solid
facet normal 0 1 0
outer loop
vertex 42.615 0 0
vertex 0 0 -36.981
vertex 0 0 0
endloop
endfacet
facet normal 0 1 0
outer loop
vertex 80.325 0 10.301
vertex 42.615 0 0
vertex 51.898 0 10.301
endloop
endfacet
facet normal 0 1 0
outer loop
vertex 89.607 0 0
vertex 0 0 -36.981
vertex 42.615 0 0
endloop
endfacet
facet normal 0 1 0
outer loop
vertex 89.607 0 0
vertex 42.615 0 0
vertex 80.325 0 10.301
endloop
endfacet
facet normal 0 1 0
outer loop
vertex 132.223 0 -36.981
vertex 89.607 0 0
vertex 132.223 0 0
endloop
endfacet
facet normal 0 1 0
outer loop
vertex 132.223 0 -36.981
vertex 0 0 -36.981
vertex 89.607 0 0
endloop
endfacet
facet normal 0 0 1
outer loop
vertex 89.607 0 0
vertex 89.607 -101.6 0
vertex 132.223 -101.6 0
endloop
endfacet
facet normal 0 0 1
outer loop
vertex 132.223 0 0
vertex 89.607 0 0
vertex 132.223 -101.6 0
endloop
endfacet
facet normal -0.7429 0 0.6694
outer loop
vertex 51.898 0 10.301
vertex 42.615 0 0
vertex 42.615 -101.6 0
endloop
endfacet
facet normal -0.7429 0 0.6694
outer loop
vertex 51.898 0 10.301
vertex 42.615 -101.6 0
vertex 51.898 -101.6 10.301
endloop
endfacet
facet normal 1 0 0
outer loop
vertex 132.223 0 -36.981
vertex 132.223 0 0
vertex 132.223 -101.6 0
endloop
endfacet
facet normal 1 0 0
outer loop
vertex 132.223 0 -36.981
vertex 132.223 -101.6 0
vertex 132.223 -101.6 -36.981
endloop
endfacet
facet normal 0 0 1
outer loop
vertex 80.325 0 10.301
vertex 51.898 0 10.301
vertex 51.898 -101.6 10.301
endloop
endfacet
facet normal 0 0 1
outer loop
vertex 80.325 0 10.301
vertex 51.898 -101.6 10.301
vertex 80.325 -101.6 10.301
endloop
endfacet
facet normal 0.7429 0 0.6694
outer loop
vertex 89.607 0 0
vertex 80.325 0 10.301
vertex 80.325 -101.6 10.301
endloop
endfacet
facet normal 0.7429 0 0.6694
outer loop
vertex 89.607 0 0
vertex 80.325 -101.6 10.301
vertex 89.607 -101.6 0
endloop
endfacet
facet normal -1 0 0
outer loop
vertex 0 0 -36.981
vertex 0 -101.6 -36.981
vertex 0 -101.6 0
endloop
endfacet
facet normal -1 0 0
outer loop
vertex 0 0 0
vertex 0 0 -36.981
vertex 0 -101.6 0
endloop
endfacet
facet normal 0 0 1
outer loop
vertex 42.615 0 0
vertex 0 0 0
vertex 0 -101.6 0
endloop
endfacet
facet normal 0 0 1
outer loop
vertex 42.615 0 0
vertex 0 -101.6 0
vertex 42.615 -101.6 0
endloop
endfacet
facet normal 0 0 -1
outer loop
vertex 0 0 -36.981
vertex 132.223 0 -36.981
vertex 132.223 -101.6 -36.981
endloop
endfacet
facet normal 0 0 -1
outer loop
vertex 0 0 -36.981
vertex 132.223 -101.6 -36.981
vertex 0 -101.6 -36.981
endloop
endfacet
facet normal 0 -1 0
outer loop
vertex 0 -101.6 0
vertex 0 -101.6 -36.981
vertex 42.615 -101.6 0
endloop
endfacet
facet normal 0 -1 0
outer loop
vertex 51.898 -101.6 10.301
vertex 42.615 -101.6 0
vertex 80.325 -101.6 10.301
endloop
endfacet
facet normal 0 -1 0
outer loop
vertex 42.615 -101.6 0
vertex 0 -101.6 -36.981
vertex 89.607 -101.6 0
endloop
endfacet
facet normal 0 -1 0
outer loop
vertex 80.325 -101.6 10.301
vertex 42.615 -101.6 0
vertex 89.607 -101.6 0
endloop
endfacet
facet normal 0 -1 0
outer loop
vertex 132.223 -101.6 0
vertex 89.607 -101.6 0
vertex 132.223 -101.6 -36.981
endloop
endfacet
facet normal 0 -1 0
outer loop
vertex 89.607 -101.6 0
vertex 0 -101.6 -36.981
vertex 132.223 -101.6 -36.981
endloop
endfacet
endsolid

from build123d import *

# Parameters (mm, degrees)
EXTRUDE1_DEPTH = 101.6


with BuildPart() as part:
    # Sketch1 → Extrude1 (new body)
    with BuildSketch(Plane(origin=(0, 0, 0), x_dir=(1, 0, 0), z_dir=(0, 1, 0))):
        Polygon((0, 36.981224411), (0, 0), (42.615353822, 0), (51.897733448, -10.30089681), (80.325021053, -10.30089681), (89.607400679, 0), (132.222754501, 0), (132.222754501, 36.981224411), align=None)
    extrude(amount=-EXTRUDE1_DEPTH)


solid = part.part
